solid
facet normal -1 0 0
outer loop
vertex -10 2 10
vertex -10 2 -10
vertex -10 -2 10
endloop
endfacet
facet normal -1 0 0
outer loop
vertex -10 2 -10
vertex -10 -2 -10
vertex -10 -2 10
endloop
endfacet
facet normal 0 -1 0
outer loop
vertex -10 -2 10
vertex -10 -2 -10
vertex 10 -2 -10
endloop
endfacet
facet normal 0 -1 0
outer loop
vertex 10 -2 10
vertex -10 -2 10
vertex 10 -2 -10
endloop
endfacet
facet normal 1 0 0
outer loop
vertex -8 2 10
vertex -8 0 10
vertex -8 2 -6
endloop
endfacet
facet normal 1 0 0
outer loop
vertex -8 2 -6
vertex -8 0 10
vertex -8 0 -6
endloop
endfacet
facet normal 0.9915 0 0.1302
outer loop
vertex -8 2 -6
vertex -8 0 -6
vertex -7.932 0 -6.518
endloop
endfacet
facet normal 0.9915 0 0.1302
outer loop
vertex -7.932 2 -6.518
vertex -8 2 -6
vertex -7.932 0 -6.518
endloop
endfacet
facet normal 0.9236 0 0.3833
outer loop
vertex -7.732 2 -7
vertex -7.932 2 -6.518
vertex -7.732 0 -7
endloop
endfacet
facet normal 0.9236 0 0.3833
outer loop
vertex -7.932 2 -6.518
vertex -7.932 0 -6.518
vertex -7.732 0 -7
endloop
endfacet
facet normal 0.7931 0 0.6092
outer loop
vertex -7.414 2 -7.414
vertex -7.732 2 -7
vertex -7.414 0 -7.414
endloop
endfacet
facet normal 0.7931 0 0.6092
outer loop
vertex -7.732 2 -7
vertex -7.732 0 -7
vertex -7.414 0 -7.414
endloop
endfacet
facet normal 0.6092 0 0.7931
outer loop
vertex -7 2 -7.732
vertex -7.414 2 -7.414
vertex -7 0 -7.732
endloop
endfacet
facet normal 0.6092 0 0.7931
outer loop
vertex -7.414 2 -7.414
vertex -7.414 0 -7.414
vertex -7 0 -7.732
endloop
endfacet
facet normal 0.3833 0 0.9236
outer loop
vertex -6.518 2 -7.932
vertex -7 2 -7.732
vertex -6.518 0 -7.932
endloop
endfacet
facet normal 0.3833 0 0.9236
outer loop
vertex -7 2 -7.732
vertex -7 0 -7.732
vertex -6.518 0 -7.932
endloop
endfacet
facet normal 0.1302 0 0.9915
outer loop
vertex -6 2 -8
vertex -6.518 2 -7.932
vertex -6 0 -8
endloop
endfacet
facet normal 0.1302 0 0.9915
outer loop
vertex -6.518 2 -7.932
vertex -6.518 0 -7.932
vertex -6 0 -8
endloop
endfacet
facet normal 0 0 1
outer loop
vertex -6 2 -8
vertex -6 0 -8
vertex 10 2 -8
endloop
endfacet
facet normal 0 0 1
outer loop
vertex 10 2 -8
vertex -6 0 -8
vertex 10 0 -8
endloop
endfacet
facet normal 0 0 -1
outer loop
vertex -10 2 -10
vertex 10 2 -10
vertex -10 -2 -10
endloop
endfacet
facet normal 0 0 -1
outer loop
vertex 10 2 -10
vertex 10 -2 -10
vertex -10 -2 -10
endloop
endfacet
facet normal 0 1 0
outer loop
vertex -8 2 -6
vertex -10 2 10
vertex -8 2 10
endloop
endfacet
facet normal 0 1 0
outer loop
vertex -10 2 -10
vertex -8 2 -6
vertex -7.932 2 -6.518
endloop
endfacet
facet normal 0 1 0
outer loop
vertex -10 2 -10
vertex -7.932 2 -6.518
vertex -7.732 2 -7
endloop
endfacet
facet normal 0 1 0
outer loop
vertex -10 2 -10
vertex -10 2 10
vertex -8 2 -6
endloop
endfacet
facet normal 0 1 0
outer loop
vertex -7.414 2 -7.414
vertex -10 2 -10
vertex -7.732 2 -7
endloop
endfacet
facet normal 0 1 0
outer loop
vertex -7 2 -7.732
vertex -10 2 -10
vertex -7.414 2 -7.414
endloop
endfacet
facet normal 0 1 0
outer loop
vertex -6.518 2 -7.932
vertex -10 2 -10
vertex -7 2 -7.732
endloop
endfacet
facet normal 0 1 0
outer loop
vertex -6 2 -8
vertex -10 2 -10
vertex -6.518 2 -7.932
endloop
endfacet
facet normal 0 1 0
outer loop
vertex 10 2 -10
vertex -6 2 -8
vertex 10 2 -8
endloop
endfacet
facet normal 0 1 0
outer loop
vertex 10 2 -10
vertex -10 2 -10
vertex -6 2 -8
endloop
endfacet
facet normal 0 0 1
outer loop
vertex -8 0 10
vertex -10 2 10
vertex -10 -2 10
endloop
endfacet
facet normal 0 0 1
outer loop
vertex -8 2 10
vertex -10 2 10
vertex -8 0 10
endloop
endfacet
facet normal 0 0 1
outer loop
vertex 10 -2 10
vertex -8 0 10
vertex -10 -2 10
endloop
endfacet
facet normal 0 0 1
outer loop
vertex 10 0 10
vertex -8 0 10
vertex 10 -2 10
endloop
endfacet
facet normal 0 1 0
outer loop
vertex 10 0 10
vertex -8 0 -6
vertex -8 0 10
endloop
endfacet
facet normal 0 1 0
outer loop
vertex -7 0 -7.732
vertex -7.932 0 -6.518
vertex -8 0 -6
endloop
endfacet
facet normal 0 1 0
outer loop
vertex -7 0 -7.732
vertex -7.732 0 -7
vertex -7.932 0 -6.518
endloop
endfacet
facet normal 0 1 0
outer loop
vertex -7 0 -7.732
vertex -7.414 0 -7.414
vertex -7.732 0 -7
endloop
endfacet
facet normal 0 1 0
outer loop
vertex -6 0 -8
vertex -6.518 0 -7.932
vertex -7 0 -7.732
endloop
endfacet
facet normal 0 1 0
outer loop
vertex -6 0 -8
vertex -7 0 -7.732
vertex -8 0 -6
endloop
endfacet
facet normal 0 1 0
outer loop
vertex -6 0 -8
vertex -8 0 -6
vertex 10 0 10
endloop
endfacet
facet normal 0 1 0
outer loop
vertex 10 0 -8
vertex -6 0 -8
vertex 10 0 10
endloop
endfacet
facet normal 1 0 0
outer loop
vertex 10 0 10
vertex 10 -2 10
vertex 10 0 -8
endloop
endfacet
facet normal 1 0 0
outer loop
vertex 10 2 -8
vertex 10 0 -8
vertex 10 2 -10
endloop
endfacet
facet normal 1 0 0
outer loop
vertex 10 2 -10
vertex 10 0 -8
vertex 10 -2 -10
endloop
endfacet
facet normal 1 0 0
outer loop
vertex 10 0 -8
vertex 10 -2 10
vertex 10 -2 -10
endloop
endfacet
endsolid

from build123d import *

# Parameters (mm, degrees)
SKETCH1_W           = 20
SKETCH1_H           = 20
BOSS_EXTRUDE2_DEPTH = 2
BOSS_EXTRUDE3_DEPTH = 2


with BuildPart() as part:
    # Sketch1 → Boss-Extrude2 (new body)
    with BuildSketch(Plane(origin=(0, 0, 0), x_dir=(1, 0, 0), z_dir=(0, 1, 0))):
        Rectangle(SKETCH1_W, SKETCH1_H)
    extrude(amount=-BOSS_EXTRUDE2_DEPTH)

    # Sketch2 → Boss-Extrude3 (add)
    with BuildSketch(Plane(origin=(0, 0, 0), x_dir=(1, 0, 0), z_dir=(0, 1, 0))):
        with BuildLine():
            Line((-6, 8), (10, 8))
            Line((10, 8), (10, 10))
            Line((10, 10), (-10, 10))
            Line((-10, 10), (-10, -10))
            Line((-10, -10), (-8, -10))
            Line((-8, -10), (-8, 6))
            ThreePointArc((-8, 6), (-7.414213562, 7.414213562), (-6, 8))
        make_face()
    extrude(amount=BOSS_EXTRUDE3_DEPTH)


solid = part.part
